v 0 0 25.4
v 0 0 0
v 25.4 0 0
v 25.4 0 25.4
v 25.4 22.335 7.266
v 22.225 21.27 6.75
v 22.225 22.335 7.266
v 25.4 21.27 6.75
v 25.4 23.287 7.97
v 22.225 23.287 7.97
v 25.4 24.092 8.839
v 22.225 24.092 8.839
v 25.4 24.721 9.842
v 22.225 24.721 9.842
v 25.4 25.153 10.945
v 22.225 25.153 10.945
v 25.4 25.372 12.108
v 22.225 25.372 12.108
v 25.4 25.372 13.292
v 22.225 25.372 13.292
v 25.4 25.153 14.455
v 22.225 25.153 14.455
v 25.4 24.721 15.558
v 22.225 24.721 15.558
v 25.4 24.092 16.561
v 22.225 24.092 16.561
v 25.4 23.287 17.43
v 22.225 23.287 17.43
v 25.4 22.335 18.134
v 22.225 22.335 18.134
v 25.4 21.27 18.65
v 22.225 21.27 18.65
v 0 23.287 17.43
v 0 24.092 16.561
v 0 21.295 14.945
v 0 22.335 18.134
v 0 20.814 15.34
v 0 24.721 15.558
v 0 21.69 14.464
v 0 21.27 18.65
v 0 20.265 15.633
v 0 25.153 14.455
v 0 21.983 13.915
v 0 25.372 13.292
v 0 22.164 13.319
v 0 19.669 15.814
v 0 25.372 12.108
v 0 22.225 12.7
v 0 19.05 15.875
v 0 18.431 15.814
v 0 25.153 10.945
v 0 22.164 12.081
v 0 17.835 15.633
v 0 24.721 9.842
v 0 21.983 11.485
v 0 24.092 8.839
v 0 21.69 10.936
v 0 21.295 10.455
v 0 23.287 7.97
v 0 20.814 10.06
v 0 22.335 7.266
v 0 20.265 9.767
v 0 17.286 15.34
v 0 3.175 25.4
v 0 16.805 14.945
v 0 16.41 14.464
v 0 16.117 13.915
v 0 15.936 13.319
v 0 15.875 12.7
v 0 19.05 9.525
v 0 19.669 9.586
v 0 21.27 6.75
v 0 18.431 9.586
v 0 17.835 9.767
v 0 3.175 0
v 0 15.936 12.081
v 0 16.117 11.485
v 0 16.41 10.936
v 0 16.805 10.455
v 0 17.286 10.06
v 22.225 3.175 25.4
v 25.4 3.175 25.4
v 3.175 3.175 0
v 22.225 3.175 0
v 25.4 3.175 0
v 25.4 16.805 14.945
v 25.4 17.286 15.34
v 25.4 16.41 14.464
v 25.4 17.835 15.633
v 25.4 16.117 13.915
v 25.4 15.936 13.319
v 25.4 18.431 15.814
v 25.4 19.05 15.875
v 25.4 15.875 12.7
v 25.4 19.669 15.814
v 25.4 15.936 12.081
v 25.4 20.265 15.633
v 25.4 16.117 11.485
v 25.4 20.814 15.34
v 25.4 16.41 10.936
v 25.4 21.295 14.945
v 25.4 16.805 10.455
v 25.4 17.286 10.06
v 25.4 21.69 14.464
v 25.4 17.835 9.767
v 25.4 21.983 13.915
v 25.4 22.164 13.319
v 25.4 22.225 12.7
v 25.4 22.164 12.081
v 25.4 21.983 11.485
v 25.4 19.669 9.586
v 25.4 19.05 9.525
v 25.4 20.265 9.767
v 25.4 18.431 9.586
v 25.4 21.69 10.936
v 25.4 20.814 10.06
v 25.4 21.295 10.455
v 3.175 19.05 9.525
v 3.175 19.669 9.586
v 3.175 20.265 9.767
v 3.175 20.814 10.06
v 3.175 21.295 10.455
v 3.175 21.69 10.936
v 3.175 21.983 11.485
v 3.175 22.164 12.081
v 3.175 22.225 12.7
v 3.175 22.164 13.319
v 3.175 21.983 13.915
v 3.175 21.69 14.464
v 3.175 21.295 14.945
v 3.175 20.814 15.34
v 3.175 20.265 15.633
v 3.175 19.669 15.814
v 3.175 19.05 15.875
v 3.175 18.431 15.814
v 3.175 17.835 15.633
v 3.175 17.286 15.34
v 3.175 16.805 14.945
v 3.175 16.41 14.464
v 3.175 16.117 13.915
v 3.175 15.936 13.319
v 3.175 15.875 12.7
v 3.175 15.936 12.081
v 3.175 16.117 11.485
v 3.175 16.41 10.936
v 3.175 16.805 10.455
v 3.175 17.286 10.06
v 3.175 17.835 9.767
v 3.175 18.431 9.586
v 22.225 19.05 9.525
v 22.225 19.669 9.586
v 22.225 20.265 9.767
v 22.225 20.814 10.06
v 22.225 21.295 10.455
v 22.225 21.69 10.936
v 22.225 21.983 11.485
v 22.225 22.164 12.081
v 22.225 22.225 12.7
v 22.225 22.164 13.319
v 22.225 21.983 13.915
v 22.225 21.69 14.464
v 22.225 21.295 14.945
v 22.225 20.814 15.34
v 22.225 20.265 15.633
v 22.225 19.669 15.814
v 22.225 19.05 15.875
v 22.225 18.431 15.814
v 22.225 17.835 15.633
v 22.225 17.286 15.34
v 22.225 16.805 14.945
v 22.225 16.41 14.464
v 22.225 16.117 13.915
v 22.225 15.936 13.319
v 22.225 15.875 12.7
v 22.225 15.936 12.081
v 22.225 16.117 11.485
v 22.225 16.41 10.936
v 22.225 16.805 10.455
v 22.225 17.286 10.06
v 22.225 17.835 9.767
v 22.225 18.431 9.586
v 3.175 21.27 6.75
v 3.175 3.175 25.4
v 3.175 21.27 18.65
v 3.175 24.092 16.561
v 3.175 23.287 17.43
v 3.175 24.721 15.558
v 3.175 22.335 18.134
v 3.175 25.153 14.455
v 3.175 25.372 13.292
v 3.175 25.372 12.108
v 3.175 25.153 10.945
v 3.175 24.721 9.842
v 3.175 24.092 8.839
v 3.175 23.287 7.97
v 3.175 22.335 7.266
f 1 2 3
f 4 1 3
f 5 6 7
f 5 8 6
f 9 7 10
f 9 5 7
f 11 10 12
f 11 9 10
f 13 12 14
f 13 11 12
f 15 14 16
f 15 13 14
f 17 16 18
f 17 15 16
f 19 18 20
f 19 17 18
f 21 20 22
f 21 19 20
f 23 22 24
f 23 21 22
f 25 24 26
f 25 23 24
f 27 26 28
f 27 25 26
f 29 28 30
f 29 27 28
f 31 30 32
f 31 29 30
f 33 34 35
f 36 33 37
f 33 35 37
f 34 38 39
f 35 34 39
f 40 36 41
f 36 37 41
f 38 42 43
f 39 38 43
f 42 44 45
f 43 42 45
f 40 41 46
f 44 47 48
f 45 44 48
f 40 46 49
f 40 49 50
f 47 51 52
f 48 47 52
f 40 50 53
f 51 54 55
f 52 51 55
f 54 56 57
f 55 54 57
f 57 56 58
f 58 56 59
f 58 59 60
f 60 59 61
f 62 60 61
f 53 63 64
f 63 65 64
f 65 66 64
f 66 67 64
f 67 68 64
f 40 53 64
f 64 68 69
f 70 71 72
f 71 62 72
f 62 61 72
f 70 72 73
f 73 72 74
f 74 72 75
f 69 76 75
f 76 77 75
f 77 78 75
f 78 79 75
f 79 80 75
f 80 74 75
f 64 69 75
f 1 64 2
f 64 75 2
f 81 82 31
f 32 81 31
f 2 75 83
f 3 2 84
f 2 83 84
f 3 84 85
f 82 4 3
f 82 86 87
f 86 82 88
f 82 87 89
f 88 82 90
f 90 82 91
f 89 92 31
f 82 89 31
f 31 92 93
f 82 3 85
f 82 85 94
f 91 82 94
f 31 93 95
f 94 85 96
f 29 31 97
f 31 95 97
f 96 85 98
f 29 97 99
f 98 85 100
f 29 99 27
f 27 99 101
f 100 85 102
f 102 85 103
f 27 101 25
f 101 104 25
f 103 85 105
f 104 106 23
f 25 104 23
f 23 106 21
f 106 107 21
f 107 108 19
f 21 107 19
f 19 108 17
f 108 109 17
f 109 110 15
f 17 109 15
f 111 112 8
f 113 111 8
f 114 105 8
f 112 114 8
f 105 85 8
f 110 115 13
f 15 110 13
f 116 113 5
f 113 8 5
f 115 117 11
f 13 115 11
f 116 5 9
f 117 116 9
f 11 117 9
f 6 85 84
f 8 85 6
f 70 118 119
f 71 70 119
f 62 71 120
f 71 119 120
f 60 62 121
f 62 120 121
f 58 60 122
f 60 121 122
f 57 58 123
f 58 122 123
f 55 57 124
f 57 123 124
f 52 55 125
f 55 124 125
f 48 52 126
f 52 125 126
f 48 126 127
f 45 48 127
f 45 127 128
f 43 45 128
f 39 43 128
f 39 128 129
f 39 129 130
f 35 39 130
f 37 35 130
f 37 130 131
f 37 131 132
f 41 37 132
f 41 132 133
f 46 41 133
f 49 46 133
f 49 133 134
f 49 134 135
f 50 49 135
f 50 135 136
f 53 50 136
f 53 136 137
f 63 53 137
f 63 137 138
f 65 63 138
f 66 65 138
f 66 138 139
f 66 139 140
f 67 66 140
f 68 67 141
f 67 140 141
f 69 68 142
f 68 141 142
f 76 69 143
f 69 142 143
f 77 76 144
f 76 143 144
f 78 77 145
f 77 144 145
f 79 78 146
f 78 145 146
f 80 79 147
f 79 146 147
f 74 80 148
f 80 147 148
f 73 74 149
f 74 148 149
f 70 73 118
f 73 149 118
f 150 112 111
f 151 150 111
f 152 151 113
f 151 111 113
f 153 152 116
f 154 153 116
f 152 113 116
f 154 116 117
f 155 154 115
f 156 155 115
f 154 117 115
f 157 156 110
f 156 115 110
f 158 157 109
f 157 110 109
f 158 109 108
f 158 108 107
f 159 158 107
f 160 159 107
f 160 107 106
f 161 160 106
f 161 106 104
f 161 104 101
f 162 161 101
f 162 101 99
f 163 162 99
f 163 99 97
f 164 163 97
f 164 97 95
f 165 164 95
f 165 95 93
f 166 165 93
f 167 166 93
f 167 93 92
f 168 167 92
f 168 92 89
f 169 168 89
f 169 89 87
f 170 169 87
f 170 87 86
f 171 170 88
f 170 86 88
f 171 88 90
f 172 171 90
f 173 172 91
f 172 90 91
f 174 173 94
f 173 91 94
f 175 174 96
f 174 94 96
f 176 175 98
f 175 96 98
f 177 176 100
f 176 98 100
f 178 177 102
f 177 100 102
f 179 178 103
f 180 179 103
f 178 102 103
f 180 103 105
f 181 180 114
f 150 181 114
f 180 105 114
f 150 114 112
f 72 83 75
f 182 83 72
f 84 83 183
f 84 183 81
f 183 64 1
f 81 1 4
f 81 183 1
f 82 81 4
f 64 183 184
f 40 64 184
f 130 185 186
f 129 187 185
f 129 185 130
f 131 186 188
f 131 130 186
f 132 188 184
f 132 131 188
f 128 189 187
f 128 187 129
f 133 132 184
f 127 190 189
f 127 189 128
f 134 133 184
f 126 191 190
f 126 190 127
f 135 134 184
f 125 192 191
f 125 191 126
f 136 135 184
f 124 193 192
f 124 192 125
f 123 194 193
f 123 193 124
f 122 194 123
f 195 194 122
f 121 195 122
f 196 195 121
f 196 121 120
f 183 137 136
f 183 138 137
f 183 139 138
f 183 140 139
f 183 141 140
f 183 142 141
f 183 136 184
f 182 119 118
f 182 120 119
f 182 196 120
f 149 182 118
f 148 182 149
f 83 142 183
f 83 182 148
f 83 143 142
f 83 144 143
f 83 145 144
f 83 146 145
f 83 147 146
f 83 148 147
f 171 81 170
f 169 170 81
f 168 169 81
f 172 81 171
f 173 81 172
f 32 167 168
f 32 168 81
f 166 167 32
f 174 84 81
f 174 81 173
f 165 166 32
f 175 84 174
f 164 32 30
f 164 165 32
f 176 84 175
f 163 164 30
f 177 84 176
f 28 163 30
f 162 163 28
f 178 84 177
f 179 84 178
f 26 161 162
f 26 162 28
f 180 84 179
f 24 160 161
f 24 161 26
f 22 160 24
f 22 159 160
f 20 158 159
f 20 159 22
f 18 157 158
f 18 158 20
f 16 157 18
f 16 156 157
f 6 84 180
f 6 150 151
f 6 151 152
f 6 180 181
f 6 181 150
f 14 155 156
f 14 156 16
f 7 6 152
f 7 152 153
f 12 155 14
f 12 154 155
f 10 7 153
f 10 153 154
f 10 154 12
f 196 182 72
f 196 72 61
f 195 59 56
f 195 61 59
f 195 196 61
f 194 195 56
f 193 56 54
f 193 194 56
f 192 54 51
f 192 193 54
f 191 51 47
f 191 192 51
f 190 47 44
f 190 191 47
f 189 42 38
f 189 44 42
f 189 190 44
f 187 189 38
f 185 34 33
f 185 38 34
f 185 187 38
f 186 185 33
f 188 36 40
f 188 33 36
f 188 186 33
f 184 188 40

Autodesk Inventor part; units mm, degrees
ref_plane "YZ Plane" through (0, 0, 0) normal (1, 0, 0) x (0, 1, 0)
ref_plane "XZ Plane" through (0, 0, 0) normal (0, 1, 0) x (-1, 0, 0)
ref_plane "XY Plane" through (0, 0, 0) normal (0, 0, 1) x (1, 0, 0)
sketch "Sketch1" plane through (0, 0, 0) normal (0, 0, 1) x (1, 0, 0)
  line L0 (0, 0) -> (25.4, 0)
  line L1 (25.4, 0) -> (25.4, 25.4)
  line L2 (0, 25.4) -> (0, 0)
  line L3 (3.175, 3.175) -> (22.225, 3.175)
  line L4 (22.225, 3.175) -> (22.225, 25.4)
  line L5 (3.175, 25.4) -> (3.175, 3.175)
  line L6 (25.4, 25.4) -> (22.225, 25.4)
  line L7 (3.175, 25.4) -> (0, 25.4)
  dimension "d0" = 25.4
  dimension "d1" = 25.4
  dimension "d2" = 3.175
  dimension "d3" = 3.175
  dimension "d4" = 3.175
extrude "Extrusion1" add sketch "Sketch1" along normal blind 25.4
sketch "Sketch2" plane through (25.4, 0, 0) normal (1, 0, 0) x (0, 0, -1)
  line L0 (-25.4, 25.4) -> (-25.4, 0) projected
  line L1 (0, 0) -> (-25.4, 0) projected
  line L2 (0, 0) -> (0, 25.4) projected
  line L3 (0, 25.4) -> (-25.4, 25.4) projected
  arc A0 (-6.7505, 21.2696) -> (-18.6495, 21.2696) centre (-12.7, 19.05) ccw
  circle A1 centre (-12.7, 19.05) radius 3.175
  line L4 (-25.4, 3.175) -> (-18.6495, 21.2696)
  line L5 (0, 3.175) -> (-6.7505, 21.2696)
  dimension "d7" = 19.05
  dimension "d8" = 12.7
  dimension "d9" = 6.35
  dimension "d10" = 3.175
  dimension "d11" = 3.175
extrude "Extrusion2" cut sketch "Sketch2" against normal blind 25.4 contours L3 A0 L4 L0 | L3 L2 L5 A0 | A1
equation "\"d1\" = d0"
equation "\"d3\" = d2"
equation "\"d4\" = d2"
equation "\"d11\" = d10"
properties part number "manipulator actuator braket"
